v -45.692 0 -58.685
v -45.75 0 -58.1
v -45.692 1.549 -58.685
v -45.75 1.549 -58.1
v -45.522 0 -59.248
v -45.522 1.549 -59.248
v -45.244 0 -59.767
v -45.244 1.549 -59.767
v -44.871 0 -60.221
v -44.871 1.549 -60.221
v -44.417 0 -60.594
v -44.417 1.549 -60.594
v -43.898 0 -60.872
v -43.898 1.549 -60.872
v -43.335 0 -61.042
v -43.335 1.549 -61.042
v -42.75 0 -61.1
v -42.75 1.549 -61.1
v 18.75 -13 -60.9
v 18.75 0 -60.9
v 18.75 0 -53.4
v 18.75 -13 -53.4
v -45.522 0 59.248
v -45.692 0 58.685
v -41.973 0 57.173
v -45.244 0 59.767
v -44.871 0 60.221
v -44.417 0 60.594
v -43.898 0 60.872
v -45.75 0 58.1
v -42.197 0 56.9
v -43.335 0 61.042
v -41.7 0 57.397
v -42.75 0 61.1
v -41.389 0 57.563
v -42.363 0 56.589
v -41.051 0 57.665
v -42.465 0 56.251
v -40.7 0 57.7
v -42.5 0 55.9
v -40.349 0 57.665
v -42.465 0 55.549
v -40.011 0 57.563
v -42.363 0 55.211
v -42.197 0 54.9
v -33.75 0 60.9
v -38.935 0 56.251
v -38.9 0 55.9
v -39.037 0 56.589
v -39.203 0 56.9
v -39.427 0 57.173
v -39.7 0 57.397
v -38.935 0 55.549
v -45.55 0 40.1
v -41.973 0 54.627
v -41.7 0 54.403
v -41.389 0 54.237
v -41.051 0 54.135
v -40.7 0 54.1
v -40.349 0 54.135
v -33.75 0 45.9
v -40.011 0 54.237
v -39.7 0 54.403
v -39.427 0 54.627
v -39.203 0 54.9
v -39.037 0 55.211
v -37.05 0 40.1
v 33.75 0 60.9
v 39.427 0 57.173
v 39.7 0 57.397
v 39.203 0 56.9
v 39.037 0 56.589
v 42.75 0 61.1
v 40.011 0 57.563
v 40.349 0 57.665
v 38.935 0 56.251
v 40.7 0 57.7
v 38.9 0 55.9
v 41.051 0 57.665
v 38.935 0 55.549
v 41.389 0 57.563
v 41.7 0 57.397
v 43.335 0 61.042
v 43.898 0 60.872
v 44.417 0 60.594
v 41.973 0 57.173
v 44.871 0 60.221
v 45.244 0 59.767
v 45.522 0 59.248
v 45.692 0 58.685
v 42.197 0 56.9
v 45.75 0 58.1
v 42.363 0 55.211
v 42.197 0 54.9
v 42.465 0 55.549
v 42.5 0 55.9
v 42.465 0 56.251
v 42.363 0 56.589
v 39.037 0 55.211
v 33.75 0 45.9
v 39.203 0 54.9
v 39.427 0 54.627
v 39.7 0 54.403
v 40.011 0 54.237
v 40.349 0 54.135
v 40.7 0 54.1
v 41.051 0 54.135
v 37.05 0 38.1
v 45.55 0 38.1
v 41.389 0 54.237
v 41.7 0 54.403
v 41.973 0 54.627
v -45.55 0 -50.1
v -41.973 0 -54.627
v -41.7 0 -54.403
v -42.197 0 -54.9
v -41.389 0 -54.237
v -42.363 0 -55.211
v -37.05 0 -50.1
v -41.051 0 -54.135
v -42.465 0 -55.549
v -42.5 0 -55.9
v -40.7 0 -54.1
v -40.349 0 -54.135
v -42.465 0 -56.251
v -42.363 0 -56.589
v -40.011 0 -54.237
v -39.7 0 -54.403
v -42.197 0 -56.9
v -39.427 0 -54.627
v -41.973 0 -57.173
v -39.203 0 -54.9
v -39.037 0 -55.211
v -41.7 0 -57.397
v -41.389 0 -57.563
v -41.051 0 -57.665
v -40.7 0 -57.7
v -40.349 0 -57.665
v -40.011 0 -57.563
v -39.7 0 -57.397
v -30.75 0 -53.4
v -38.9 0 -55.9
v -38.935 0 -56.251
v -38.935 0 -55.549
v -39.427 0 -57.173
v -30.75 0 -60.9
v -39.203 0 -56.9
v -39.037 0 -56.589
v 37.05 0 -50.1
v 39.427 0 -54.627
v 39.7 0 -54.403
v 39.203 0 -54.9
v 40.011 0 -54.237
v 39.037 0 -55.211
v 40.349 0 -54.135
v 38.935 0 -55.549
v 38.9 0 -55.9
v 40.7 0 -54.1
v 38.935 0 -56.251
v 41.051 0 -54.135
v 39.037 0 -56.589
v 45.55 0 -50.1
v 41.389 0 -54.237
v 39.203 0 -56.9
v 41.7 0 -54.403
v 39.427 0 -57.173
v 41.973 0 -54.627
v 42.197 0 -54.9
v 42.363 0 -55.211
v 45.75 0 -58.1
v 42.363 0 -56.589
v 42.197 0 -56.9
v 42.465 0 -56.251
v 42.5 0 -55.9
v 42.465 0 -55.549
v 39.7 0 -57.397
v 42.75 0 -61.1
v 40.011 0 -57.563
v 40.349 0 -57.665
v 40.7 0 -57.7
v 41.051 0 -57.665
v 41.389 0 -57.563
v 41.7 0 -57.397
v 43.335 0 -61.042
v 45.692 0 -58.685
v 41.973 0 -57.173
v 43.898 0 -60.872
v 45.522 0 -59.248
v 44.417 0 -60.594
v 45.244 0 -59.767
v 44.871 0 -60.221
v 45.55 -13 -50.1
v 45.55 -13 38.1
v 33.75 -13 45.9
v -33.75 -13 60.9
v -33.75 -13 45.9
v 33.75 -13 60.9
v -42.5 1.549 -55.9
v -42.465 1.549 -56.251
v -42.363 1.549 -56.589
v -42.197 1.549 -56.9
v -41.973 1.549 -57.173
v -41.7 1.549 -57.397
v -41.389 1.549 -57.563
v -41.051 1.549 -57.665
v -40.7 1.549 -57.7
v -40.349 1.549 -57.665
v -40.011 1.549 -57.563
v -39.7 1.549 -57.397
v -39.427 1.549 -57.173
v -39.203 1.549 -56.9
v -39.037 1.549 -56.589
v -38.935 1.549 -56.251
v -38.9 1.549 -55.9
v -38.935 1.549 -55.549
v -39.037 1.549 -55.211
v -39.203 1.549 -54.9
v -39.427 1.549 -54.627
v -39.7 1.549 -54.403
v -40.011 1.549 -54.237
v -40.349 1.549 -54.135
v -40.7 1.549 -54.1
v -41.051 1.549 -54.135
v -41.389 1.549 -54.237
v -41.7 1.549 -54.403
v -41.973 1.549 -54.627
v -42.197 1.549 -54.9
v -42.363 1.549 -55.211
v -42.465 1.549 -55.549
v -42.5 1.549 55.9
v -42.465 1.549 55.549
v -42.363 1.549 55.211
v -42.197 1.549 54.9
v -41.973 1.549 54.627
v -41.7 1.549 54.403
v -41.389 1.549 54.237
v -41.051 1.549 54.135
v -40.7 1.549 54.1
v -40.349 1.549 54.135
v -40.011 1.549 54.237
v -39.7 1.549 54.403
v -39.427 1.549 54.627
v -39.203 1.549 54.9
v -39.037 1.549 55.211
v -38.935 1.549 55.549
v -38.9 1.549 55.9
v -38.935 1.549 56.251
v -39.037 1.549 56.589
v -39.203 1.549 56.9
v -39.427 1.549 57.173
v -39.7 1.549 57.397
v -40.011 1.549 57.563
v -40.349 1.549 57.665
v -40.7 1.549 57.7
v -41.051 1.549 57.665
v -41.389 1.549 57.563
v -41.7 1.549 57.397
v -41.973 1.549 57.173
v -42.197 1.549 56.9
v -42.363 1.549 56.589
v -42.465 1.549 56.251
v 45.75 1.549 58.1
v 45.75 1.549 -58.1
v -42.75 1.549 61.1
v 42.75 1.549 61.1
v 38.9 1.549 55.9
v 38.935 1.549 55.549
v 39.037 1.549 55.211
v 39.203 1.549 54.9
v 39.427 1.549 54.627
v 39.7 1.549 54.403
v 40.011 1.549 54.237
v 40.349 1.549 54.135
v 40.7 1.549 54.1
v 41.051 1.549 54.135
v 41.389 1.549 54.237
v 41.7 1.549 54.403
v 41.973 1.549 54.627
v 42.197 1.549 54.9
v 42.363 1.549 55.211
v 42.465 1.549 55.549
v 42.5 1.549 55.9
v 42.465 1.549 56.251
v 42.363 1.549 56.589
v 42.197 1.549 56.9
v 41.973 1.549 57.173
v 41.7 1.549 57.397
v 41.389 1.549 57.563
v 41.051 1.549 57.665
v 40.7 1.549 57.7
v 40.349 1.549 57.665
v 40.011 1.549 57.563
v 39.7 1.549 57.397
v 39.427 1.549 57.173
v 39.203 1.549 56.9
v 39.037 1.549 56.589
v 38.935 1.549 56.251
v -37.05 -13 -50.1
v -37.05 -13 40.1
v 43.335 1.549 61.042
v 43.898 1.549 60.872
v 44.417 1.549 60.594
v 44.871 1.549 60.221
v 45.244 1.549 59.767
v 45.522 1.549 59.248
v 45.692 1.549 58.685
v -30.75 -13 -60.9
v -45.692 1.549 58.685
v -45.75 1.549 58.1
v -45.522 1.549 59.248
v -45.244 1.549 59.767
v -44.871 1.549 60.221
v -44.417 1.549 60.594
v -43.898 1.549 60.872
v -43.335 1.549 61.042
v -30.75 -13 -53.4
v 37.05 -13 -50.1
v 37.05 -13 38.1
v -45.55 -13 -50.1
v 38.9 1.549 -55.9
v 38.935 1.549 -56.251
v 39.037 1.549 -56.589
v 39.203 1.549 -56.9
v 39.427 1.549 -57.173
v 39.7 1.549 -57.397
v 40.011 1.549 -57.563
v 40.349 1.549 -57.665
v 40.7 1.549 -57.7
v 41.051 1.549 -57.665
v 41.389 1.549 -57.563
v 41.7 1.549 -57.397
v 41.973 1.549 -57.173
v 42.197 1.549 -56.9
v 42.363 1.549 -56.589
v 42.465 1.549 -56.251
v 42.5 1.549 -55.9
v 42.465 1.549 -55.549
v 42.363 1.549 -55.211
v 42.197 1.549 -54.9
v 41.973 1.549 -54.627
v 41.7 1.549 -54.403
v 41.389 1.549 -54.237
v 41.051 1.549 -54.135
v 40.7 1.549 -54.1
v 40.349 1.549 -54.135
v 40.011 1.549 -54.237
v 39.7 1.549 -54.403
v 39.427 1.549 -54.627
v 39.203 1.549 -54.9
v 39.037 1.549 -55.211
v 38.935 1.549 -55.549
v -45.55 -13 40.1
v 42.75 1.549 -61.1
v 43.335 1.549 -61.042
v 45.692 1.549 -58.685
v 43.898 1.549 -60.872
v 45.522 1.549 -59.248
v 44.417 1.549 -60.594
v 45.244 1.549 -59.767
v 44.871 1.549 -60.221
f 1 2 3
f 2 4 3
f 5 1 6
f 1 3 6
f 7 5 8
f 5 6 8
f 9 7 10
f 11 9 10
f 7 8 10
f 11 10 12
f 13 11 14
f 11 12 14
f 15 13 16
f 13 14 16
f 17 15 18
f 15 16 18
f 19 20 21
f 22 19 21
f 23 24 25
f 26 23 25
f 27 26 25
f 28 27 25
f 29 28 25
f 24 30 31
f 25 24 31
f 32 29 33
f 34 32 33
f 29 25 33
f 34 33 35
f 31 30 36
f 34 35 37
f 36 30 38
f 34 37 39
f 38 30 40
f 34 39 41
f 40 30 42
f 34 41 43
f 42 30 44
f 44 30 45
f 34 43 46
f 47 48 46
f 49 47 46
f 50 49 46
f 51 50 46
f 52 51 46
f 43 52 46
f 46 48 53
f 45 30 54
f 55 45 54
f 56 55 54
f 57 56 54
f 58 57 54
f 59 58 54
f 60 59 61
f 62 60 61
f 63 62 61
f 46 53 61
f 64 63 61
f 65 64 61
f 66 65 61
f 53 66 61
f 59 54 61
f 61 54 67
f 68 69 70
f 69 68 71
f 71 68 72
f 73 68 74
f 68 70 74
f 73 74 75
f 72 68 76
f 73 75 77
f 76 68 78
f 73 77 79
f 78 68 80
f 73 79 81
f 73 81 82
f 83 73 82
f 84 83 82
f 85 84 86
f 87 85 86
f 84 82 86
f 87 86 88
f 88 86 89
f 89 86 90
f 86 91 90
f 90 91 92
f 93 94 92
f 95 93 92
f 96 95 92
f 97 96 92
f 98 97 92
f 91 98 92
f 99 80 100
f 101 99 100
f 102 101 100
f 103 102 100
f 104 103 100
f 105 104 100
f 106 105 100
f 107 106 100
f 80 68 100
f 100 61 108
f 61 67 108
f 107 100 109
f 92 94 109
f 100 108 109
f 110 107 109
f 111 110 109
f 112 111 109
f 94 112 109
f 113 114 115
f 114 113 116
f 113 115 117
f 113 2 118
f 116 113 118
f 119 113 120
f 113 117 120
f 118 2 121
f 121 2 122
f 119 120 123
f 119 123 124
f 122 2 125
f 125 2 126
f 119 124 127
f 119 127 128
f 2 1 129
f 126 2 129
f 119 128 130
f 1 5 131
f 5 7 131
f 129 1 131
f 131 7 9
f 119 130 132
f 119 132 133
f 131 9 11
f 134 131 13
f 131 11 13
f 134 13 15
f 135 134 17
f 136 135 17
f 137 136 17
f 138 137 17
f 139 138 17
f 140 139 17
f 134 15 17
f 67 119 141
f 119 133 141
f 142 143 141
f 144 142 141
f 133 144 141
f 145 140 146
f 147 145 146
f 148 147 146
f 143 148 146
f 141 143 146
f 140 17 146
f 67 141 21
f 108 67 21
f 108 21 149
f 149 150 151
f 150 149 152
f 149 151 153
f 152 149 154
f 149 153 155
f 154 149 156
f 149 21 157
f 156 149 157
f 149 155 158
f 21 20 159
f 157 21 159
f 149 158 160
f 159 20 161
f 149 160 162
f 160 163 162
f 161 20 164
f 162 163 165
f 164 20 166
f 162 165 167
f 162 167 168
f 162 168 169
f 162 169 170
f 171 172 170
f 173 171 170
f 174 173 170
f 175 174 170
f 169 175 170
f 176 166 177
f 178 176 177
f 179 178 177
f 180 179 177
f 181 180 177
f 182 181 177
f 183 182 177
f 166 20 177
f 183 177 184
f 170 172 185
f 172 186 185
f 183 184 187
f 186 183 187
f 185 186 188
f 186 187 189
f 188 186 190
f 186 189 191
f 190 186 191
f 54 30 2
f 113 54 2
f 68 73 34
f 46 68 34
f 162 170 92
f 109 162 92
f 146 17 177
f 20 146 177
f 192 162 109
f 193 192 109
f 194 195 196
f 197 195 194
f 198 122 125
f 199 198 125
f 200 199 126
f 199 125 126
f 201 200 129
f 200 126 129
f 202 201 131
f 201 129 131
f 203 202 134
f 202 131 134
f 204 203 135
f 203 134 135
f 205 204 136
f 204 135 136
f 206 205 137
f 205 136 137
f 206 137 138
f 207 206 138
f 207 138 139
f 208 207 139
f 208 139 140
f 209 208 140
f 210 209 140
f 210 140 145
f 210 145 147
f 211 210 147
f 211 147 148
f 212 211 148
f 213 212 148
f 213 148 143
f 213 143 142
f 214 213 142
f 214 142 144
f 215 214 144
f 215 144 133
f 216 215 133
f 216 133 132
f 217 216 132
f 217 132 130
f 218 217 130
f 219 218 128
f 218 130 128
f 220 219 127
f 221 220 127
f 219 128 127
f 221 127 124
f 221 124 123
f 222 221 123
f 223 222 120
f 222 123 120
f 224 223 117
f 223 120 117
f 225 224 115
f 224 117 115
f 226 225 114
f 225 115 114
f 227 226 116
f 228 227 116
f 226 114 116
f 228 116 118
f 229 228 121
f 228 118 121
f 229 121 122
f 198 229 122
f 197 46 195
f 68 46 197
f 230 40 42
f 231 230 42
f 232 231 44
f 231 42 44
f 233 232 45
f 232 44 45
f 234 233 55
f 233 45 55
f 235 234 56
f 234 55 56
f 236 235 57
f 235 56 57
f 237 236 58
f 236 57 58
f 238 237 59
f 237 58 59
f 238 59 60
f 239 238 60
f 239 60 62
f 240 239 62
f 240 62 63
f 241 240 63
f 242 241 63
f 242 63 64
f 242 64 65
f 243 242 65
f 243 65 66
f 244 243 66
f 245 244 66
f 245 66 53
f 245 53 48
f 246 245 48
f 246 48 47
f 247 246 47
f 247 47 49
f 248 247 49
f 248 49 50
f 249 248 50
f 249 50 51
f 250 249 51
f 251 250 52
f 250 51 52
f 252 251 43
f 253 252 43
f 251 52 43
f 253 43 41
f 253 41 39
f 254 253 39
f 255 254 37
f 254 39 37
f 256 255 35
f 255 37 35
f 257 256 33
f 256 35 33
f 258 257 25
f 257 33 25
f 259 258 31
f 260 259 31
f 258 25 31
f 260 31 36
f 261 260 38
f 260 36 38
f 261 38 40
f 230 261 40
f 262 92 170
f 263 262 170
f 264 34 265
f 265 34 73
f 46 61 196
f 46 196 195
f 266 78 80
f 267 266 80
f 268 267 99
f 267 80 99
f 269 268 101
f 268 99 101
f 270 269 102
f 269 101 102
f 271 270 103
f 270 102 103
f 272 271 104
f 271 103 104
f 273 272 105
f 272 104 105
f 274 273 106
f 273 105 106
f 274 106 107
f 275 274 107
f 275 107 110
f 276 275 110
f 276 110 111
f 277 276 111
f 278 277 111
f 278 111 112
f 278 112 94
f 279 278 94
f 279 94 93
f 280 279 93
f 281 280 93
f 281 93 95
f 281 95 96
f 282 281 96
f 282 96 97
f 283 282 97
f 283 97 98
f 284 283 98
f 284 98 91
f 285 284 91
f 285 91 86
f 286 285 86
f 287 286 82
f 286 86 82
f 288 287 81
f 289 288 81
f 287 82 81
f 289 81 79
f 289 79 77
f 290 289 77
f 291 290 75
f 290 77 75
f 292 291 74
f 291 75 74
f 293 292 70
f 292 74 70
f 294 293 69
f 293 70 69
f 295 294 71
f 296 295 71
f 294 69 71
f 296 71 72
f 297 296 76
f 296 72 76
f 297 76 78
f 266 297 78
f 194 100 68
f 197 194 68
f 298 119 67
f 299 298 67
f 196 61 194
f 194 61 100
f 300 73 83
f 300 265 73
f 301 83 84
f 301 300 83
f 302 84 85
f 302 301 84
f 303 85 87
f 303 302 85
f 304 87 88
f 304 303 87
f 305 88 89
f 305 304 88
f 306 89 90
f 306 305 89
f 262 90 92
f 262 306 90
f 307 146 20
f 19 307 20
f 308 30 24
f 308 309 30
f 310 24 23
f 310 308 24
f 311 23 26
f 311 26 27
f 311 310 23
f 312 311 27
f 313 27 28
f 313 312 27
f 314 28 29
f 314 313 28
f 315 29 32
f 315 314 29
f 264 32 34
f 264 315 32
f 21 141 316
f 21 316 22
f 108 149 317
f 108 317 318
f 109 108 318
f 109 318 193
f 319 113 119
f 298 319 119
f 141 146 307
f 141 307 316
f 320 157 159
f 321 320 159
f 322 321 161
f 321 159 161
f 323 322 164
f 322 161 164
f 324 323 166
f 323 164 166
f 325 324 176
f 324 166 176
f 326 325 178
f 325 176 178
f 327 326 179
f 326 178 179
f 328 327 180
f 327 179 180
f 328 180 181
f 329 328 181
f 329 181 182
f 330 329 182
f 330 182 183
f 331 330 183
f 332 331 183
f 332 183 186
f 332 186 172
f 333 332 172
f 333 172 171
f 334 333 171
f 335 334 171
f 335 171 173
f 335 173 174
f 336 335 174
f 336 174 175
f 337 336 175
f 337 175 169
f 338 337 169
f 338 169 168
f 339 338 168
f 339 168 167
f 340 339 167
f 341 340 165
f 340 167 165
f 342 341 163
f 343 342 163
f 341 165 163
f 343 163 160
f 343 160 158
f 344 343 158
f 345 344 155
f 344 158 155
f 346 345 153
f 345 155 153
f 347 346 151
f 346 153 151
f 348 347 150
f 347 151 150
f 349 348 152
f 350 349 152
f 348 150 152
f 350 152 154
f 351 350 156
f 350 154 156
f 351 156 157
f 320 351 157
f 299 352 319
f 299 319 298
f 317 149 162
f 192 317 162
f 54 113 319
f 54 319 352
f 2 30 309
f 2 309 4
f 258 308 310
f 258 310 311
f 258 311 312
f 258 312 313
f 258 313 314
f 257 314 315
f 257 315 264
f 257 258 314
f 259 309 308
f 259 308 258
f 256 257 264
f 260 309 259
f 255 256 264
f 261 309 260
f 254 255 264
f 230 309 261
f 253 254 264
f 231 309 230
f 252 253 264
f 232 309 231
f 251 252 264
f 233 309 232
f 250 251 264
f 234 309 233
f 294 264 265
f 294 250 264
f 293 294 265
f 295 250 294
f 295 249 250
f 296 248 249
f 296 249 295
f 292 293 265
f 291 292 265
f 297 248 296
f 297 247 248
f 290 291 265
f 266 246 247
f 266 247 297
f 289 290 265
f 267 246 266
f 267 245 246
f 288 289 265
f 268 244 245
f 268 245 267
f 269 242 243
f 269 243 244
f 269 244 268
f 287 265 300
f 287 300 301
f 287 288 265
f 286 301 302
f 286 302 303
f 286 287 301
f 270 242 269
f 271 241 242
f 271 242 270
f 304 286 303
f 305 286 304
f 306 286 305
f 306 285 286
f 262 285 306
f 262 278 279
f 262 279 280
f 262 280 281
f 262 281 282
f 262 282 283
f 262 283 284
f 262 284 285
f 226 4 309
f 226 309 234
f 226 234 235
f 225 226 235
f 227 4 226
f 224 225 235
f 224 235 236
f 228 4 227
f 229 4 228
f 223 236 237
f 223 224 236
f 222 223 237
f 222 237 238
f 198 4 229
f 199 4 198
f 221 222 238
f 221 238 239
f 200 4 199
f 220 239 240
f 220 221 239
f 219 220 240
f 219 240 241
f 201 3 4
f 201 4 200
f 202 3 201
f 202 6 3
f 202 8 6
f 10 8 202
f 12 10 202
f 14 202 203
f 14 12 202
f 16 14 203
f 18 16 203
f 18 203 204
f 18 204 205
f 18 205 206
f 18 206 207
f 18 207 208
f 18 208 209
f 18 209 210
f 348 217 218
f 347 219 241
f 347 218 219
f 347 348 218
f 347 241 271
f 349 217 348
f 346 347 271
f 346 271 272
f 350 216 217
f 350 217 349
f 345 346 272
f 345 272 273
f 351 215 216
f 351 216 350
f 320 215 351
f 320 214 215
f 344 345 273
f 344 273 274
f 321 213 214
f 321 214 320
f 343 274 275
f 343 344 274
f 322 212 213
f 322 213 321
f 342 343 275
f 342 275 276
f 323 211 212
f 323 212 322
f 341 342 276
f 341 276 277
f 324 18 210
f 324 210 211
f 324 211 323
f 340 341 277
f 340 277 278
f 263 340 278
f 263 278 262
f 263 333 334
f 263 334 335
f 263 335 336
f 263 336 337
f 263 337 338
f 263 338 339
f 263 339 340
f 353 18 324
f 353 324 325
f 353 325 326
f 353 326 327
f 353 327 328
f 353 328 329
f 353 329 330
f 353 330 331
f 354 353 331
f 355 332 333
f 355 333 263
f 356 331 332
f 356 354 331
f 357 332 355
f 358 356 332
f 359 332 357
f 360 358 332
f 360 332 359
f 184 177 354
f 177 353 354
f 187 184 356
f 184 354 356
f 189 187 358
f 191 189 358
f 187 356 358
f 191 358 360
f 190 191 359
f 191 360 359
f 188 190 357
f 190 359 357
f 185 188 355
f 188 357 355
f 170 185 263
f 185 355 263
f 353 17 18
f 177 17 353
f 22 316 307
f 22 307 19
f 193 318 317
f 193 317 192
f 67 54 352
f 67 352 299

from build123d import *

# Parameters (mm, degrees)
SKETCH1_W                = 91.5
SKETCH1_H                = 122.2
BOSS_EXTRUDE1_DEPTH      = 1.5494
M3_CLEARANCE_HOLE1_D     = 3.6
M3_CLEARANCE_HOLE1_DEPTH = 12
FILLET1_R                = 3
SKETCH4_W                = 8.5
SKETCH4_H                = 88.2
SKETCH4_W_2              = 49.5
SKETCH4_H_2              = 7.5
SKETCH4_H_3              = 90.2
SKETCH4_W_3              = 67.5
SKETCH4_H_4              = 15
BOSS_EXTRUDE2_DEPTH      = 13


with BuildPart() as part:
    # Sketch1 → Boss-Extrude1 (new body)
    with BuildSketch(Plane(origin=(0, 0, 0), x_dir=(1, 0, 0), z_dir=(0, 1, 0))):
        Rectangle(SKETCH1_W, SKETCH1_H)
    extrude(amount=BOSS_EXTRUDE1_DEPTH)

    # M3 Clearance Hole1
    with Locations(Plane(origin=(0, 1.5494, 0), x_dir=(1, 0, 0), z_dir=(0, 1, 0))):
        with Locations((-40.7, 55.9), (40.7, -55.9), (40.7, 55.9), (-40.7, -55.9)):
            Hole(M3_CLEARANCE_HOLE1_D / 2, depth=M3_CLEARANCE_HOLE1_DEPTH)

    # Fillet1
    fillet1_edges = [part.edges().sort_by_distance(p)[0] for p in [
        (-45.75, 0.7747, -61.1),
        (45.75, 0.7747, -61.1),
        (45.75, 0.7747, 61.1),
        (-45.75, 0.7747, 61.1),
    ]]
    fillet(fillet1_edges, radius=FILLET1_R)

    # Sketch4 → Boss-Extrude2 (add)
    with BuildSketch(Plane.XZ):
        with Locations((41.3, -6)):
            Rectangle(SKETCH4_W, SKETCH4_H)
        with Locations((-6, -57.15)):
            Rectangle(SKETCH4_W_2, SKETCH4_H_2)
        with Locations((-41.3, -5)):
            Rectangle(SKETCH4_W, SKETCH4_H_3)
        with Locations((0, 53.4)):
            Rectangle(SKETCH4_W_3, SKETCH4_H_4)
    extrude(amount=BOSS_EXTRUDE2_DEPTH)


solid = part.part
